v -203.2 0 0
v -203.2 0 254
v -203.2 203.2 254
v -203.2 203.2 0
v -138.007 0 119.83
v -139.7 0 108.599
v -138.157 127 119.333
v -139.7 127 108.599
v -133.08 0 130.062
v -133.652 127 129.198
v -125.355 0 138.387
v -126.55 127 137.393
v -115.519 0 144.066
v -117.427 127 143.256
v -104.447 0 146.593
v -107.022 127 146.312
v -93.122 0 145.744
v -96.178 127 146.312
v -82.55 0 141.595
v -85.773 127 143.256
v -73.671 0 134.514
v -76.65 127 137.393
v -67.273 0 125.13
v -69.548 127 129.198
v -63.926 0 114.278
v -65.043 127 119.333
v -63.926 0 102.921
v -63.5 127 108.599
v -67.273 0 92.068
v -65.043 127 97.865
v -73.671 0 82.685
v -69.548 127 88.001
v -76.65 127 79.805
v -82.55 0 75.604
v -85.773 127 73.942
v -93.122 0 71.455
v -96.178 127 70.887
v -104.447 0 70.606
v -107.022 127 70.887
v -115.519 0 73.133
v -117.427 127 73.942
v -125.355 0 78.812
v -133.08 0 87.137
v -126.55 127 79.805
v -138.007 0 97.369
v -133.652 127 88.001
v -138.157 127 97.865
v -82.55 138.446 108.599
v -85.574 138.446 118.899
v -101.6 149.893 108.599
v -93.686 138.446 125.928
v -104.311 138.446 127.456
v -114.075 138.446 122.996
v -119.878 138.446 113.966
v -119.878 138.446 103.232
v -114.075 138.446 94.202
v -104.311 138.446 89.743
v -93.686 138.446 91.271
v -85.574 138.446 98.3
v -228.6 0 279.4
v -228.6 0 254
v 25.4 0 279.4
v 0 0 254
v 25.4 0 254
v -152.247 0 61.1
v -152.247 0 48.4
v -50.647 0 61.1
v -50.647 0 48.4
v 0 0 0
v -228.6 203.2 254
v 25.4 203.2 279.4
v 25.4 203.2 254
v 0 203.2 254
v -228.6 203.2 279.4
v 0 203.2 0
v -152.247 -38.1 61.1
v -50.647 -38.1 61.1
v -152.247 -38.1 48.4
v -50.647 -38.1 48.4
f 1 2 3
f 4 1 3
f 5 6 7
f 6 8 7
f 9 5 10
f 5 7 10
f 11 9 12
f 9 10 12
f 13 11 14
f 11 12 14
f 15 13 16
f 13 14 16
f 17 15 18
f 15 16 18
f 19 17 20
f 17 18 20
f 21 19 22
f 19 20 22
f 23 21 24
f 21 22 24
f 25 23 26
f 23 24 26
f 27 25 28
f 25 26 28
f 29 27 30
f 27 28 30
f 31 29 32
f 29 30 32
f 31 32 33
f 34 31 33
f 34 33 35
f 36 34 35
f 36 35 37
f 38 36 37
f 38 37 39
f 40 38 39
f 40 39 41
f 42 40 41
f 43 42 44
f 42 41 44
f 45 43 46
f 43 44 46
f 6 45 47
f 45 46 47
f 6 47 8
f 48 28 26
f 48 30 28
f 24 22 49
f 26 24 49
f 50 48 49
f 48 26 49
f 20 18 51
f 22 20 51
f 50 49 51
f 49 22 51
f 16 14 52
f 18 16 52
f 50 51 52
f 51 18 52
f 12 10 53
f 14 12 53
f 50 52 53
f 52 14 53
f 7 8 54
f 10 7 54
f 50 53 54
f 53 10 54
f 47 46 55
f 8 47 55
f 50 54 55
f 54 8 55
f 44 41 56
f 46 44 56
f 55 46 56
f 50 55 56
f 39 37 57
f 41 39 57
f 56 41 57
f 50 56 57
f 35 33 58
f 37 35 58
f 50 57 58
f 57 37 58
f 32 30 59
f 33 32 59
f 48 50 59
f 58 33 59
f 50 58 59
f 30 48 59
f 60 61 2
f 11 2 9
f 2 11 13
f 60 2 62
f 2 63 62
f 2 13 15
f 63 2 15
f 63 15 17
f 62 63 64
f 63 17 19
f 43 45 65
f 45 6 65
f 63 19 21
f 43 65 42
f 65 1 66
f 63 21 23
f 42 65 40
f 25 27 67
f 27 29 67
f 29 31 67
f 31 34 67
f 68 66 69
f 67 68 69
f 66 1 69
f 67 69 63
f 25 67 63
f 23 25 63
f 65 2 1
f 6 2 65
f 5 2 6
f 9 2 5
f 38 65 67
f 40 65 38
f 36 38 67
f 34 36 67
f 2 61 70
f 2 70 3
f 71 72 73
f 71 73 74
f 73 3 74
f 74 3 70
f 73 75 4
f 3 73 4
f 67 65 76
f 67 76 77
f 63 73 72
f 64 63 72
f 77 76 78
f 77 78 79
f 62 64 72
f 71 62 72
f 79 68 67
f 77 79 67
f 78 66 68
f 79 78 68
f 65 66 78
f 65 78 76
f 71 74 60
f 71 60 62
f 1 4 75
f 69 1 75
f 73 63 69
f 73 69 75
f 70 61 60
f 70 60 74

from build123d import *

# Parameters (mm, degrees)
F0_W     = 203.2
F0_H     = 203.2
F1_DEPTH = 254
F3_W     = 25.4
F3_H     = 203.2
F3_W_2   = 203.2
F4_DEPTH = 25.4
F5_D     = 76.2
F5_DEPTH = 127
F5_TIP   = 22.892789585
F6_W     = 101.6
F6_H     = 12.7
F7_DEPTH = 38.1


with BuildPart() as f1:
    # F0 (on Top) → F1 (new body)
    with BuildSketch(Plane.XY):
        with Locations((-101.6, 101.6)):
            Rectangle(F0_W, F0_H)
    extrude(amount=F1_DEPTH)

    # F3 (on face) → F4 (join)
    with BuildSketch(Plane.XY.offset(254)):
        with Locations((-215.9, 101.6)):
            Rectangle(F3_W, F3_H)
        with Locations((12.7, 101.6)):
            Rectangle(F3_W, F3_H)
        with Locations((-101.6, 101.6)):
            Rectangle(F3_W_2, F3_H)
    extrude(amount=F4_DEPTH)

    # F5
    with Locations(Plane.XZ):
        with Locations((-101.6, 108.5994392633)):
            Hole(F5_D / 2, depth=F5_DEPTH)
            with Locations((0, 0, -(F5_DEPTH + F5_TIP / 2))):  # 118° drill point
                Cone(0, F5_D / 2, F5_TIP, mode=Mode.SUBTRACT)

    # F6 (on face) → F7 (join)
    with BuildSketch(Plane.XZ):
        with Locations((-101.4467881441, 54.7498768032)):
            Rectangle(F6_W, F6_H)
    extrude(amount=F7_DEPTH)


solid = f1.part
